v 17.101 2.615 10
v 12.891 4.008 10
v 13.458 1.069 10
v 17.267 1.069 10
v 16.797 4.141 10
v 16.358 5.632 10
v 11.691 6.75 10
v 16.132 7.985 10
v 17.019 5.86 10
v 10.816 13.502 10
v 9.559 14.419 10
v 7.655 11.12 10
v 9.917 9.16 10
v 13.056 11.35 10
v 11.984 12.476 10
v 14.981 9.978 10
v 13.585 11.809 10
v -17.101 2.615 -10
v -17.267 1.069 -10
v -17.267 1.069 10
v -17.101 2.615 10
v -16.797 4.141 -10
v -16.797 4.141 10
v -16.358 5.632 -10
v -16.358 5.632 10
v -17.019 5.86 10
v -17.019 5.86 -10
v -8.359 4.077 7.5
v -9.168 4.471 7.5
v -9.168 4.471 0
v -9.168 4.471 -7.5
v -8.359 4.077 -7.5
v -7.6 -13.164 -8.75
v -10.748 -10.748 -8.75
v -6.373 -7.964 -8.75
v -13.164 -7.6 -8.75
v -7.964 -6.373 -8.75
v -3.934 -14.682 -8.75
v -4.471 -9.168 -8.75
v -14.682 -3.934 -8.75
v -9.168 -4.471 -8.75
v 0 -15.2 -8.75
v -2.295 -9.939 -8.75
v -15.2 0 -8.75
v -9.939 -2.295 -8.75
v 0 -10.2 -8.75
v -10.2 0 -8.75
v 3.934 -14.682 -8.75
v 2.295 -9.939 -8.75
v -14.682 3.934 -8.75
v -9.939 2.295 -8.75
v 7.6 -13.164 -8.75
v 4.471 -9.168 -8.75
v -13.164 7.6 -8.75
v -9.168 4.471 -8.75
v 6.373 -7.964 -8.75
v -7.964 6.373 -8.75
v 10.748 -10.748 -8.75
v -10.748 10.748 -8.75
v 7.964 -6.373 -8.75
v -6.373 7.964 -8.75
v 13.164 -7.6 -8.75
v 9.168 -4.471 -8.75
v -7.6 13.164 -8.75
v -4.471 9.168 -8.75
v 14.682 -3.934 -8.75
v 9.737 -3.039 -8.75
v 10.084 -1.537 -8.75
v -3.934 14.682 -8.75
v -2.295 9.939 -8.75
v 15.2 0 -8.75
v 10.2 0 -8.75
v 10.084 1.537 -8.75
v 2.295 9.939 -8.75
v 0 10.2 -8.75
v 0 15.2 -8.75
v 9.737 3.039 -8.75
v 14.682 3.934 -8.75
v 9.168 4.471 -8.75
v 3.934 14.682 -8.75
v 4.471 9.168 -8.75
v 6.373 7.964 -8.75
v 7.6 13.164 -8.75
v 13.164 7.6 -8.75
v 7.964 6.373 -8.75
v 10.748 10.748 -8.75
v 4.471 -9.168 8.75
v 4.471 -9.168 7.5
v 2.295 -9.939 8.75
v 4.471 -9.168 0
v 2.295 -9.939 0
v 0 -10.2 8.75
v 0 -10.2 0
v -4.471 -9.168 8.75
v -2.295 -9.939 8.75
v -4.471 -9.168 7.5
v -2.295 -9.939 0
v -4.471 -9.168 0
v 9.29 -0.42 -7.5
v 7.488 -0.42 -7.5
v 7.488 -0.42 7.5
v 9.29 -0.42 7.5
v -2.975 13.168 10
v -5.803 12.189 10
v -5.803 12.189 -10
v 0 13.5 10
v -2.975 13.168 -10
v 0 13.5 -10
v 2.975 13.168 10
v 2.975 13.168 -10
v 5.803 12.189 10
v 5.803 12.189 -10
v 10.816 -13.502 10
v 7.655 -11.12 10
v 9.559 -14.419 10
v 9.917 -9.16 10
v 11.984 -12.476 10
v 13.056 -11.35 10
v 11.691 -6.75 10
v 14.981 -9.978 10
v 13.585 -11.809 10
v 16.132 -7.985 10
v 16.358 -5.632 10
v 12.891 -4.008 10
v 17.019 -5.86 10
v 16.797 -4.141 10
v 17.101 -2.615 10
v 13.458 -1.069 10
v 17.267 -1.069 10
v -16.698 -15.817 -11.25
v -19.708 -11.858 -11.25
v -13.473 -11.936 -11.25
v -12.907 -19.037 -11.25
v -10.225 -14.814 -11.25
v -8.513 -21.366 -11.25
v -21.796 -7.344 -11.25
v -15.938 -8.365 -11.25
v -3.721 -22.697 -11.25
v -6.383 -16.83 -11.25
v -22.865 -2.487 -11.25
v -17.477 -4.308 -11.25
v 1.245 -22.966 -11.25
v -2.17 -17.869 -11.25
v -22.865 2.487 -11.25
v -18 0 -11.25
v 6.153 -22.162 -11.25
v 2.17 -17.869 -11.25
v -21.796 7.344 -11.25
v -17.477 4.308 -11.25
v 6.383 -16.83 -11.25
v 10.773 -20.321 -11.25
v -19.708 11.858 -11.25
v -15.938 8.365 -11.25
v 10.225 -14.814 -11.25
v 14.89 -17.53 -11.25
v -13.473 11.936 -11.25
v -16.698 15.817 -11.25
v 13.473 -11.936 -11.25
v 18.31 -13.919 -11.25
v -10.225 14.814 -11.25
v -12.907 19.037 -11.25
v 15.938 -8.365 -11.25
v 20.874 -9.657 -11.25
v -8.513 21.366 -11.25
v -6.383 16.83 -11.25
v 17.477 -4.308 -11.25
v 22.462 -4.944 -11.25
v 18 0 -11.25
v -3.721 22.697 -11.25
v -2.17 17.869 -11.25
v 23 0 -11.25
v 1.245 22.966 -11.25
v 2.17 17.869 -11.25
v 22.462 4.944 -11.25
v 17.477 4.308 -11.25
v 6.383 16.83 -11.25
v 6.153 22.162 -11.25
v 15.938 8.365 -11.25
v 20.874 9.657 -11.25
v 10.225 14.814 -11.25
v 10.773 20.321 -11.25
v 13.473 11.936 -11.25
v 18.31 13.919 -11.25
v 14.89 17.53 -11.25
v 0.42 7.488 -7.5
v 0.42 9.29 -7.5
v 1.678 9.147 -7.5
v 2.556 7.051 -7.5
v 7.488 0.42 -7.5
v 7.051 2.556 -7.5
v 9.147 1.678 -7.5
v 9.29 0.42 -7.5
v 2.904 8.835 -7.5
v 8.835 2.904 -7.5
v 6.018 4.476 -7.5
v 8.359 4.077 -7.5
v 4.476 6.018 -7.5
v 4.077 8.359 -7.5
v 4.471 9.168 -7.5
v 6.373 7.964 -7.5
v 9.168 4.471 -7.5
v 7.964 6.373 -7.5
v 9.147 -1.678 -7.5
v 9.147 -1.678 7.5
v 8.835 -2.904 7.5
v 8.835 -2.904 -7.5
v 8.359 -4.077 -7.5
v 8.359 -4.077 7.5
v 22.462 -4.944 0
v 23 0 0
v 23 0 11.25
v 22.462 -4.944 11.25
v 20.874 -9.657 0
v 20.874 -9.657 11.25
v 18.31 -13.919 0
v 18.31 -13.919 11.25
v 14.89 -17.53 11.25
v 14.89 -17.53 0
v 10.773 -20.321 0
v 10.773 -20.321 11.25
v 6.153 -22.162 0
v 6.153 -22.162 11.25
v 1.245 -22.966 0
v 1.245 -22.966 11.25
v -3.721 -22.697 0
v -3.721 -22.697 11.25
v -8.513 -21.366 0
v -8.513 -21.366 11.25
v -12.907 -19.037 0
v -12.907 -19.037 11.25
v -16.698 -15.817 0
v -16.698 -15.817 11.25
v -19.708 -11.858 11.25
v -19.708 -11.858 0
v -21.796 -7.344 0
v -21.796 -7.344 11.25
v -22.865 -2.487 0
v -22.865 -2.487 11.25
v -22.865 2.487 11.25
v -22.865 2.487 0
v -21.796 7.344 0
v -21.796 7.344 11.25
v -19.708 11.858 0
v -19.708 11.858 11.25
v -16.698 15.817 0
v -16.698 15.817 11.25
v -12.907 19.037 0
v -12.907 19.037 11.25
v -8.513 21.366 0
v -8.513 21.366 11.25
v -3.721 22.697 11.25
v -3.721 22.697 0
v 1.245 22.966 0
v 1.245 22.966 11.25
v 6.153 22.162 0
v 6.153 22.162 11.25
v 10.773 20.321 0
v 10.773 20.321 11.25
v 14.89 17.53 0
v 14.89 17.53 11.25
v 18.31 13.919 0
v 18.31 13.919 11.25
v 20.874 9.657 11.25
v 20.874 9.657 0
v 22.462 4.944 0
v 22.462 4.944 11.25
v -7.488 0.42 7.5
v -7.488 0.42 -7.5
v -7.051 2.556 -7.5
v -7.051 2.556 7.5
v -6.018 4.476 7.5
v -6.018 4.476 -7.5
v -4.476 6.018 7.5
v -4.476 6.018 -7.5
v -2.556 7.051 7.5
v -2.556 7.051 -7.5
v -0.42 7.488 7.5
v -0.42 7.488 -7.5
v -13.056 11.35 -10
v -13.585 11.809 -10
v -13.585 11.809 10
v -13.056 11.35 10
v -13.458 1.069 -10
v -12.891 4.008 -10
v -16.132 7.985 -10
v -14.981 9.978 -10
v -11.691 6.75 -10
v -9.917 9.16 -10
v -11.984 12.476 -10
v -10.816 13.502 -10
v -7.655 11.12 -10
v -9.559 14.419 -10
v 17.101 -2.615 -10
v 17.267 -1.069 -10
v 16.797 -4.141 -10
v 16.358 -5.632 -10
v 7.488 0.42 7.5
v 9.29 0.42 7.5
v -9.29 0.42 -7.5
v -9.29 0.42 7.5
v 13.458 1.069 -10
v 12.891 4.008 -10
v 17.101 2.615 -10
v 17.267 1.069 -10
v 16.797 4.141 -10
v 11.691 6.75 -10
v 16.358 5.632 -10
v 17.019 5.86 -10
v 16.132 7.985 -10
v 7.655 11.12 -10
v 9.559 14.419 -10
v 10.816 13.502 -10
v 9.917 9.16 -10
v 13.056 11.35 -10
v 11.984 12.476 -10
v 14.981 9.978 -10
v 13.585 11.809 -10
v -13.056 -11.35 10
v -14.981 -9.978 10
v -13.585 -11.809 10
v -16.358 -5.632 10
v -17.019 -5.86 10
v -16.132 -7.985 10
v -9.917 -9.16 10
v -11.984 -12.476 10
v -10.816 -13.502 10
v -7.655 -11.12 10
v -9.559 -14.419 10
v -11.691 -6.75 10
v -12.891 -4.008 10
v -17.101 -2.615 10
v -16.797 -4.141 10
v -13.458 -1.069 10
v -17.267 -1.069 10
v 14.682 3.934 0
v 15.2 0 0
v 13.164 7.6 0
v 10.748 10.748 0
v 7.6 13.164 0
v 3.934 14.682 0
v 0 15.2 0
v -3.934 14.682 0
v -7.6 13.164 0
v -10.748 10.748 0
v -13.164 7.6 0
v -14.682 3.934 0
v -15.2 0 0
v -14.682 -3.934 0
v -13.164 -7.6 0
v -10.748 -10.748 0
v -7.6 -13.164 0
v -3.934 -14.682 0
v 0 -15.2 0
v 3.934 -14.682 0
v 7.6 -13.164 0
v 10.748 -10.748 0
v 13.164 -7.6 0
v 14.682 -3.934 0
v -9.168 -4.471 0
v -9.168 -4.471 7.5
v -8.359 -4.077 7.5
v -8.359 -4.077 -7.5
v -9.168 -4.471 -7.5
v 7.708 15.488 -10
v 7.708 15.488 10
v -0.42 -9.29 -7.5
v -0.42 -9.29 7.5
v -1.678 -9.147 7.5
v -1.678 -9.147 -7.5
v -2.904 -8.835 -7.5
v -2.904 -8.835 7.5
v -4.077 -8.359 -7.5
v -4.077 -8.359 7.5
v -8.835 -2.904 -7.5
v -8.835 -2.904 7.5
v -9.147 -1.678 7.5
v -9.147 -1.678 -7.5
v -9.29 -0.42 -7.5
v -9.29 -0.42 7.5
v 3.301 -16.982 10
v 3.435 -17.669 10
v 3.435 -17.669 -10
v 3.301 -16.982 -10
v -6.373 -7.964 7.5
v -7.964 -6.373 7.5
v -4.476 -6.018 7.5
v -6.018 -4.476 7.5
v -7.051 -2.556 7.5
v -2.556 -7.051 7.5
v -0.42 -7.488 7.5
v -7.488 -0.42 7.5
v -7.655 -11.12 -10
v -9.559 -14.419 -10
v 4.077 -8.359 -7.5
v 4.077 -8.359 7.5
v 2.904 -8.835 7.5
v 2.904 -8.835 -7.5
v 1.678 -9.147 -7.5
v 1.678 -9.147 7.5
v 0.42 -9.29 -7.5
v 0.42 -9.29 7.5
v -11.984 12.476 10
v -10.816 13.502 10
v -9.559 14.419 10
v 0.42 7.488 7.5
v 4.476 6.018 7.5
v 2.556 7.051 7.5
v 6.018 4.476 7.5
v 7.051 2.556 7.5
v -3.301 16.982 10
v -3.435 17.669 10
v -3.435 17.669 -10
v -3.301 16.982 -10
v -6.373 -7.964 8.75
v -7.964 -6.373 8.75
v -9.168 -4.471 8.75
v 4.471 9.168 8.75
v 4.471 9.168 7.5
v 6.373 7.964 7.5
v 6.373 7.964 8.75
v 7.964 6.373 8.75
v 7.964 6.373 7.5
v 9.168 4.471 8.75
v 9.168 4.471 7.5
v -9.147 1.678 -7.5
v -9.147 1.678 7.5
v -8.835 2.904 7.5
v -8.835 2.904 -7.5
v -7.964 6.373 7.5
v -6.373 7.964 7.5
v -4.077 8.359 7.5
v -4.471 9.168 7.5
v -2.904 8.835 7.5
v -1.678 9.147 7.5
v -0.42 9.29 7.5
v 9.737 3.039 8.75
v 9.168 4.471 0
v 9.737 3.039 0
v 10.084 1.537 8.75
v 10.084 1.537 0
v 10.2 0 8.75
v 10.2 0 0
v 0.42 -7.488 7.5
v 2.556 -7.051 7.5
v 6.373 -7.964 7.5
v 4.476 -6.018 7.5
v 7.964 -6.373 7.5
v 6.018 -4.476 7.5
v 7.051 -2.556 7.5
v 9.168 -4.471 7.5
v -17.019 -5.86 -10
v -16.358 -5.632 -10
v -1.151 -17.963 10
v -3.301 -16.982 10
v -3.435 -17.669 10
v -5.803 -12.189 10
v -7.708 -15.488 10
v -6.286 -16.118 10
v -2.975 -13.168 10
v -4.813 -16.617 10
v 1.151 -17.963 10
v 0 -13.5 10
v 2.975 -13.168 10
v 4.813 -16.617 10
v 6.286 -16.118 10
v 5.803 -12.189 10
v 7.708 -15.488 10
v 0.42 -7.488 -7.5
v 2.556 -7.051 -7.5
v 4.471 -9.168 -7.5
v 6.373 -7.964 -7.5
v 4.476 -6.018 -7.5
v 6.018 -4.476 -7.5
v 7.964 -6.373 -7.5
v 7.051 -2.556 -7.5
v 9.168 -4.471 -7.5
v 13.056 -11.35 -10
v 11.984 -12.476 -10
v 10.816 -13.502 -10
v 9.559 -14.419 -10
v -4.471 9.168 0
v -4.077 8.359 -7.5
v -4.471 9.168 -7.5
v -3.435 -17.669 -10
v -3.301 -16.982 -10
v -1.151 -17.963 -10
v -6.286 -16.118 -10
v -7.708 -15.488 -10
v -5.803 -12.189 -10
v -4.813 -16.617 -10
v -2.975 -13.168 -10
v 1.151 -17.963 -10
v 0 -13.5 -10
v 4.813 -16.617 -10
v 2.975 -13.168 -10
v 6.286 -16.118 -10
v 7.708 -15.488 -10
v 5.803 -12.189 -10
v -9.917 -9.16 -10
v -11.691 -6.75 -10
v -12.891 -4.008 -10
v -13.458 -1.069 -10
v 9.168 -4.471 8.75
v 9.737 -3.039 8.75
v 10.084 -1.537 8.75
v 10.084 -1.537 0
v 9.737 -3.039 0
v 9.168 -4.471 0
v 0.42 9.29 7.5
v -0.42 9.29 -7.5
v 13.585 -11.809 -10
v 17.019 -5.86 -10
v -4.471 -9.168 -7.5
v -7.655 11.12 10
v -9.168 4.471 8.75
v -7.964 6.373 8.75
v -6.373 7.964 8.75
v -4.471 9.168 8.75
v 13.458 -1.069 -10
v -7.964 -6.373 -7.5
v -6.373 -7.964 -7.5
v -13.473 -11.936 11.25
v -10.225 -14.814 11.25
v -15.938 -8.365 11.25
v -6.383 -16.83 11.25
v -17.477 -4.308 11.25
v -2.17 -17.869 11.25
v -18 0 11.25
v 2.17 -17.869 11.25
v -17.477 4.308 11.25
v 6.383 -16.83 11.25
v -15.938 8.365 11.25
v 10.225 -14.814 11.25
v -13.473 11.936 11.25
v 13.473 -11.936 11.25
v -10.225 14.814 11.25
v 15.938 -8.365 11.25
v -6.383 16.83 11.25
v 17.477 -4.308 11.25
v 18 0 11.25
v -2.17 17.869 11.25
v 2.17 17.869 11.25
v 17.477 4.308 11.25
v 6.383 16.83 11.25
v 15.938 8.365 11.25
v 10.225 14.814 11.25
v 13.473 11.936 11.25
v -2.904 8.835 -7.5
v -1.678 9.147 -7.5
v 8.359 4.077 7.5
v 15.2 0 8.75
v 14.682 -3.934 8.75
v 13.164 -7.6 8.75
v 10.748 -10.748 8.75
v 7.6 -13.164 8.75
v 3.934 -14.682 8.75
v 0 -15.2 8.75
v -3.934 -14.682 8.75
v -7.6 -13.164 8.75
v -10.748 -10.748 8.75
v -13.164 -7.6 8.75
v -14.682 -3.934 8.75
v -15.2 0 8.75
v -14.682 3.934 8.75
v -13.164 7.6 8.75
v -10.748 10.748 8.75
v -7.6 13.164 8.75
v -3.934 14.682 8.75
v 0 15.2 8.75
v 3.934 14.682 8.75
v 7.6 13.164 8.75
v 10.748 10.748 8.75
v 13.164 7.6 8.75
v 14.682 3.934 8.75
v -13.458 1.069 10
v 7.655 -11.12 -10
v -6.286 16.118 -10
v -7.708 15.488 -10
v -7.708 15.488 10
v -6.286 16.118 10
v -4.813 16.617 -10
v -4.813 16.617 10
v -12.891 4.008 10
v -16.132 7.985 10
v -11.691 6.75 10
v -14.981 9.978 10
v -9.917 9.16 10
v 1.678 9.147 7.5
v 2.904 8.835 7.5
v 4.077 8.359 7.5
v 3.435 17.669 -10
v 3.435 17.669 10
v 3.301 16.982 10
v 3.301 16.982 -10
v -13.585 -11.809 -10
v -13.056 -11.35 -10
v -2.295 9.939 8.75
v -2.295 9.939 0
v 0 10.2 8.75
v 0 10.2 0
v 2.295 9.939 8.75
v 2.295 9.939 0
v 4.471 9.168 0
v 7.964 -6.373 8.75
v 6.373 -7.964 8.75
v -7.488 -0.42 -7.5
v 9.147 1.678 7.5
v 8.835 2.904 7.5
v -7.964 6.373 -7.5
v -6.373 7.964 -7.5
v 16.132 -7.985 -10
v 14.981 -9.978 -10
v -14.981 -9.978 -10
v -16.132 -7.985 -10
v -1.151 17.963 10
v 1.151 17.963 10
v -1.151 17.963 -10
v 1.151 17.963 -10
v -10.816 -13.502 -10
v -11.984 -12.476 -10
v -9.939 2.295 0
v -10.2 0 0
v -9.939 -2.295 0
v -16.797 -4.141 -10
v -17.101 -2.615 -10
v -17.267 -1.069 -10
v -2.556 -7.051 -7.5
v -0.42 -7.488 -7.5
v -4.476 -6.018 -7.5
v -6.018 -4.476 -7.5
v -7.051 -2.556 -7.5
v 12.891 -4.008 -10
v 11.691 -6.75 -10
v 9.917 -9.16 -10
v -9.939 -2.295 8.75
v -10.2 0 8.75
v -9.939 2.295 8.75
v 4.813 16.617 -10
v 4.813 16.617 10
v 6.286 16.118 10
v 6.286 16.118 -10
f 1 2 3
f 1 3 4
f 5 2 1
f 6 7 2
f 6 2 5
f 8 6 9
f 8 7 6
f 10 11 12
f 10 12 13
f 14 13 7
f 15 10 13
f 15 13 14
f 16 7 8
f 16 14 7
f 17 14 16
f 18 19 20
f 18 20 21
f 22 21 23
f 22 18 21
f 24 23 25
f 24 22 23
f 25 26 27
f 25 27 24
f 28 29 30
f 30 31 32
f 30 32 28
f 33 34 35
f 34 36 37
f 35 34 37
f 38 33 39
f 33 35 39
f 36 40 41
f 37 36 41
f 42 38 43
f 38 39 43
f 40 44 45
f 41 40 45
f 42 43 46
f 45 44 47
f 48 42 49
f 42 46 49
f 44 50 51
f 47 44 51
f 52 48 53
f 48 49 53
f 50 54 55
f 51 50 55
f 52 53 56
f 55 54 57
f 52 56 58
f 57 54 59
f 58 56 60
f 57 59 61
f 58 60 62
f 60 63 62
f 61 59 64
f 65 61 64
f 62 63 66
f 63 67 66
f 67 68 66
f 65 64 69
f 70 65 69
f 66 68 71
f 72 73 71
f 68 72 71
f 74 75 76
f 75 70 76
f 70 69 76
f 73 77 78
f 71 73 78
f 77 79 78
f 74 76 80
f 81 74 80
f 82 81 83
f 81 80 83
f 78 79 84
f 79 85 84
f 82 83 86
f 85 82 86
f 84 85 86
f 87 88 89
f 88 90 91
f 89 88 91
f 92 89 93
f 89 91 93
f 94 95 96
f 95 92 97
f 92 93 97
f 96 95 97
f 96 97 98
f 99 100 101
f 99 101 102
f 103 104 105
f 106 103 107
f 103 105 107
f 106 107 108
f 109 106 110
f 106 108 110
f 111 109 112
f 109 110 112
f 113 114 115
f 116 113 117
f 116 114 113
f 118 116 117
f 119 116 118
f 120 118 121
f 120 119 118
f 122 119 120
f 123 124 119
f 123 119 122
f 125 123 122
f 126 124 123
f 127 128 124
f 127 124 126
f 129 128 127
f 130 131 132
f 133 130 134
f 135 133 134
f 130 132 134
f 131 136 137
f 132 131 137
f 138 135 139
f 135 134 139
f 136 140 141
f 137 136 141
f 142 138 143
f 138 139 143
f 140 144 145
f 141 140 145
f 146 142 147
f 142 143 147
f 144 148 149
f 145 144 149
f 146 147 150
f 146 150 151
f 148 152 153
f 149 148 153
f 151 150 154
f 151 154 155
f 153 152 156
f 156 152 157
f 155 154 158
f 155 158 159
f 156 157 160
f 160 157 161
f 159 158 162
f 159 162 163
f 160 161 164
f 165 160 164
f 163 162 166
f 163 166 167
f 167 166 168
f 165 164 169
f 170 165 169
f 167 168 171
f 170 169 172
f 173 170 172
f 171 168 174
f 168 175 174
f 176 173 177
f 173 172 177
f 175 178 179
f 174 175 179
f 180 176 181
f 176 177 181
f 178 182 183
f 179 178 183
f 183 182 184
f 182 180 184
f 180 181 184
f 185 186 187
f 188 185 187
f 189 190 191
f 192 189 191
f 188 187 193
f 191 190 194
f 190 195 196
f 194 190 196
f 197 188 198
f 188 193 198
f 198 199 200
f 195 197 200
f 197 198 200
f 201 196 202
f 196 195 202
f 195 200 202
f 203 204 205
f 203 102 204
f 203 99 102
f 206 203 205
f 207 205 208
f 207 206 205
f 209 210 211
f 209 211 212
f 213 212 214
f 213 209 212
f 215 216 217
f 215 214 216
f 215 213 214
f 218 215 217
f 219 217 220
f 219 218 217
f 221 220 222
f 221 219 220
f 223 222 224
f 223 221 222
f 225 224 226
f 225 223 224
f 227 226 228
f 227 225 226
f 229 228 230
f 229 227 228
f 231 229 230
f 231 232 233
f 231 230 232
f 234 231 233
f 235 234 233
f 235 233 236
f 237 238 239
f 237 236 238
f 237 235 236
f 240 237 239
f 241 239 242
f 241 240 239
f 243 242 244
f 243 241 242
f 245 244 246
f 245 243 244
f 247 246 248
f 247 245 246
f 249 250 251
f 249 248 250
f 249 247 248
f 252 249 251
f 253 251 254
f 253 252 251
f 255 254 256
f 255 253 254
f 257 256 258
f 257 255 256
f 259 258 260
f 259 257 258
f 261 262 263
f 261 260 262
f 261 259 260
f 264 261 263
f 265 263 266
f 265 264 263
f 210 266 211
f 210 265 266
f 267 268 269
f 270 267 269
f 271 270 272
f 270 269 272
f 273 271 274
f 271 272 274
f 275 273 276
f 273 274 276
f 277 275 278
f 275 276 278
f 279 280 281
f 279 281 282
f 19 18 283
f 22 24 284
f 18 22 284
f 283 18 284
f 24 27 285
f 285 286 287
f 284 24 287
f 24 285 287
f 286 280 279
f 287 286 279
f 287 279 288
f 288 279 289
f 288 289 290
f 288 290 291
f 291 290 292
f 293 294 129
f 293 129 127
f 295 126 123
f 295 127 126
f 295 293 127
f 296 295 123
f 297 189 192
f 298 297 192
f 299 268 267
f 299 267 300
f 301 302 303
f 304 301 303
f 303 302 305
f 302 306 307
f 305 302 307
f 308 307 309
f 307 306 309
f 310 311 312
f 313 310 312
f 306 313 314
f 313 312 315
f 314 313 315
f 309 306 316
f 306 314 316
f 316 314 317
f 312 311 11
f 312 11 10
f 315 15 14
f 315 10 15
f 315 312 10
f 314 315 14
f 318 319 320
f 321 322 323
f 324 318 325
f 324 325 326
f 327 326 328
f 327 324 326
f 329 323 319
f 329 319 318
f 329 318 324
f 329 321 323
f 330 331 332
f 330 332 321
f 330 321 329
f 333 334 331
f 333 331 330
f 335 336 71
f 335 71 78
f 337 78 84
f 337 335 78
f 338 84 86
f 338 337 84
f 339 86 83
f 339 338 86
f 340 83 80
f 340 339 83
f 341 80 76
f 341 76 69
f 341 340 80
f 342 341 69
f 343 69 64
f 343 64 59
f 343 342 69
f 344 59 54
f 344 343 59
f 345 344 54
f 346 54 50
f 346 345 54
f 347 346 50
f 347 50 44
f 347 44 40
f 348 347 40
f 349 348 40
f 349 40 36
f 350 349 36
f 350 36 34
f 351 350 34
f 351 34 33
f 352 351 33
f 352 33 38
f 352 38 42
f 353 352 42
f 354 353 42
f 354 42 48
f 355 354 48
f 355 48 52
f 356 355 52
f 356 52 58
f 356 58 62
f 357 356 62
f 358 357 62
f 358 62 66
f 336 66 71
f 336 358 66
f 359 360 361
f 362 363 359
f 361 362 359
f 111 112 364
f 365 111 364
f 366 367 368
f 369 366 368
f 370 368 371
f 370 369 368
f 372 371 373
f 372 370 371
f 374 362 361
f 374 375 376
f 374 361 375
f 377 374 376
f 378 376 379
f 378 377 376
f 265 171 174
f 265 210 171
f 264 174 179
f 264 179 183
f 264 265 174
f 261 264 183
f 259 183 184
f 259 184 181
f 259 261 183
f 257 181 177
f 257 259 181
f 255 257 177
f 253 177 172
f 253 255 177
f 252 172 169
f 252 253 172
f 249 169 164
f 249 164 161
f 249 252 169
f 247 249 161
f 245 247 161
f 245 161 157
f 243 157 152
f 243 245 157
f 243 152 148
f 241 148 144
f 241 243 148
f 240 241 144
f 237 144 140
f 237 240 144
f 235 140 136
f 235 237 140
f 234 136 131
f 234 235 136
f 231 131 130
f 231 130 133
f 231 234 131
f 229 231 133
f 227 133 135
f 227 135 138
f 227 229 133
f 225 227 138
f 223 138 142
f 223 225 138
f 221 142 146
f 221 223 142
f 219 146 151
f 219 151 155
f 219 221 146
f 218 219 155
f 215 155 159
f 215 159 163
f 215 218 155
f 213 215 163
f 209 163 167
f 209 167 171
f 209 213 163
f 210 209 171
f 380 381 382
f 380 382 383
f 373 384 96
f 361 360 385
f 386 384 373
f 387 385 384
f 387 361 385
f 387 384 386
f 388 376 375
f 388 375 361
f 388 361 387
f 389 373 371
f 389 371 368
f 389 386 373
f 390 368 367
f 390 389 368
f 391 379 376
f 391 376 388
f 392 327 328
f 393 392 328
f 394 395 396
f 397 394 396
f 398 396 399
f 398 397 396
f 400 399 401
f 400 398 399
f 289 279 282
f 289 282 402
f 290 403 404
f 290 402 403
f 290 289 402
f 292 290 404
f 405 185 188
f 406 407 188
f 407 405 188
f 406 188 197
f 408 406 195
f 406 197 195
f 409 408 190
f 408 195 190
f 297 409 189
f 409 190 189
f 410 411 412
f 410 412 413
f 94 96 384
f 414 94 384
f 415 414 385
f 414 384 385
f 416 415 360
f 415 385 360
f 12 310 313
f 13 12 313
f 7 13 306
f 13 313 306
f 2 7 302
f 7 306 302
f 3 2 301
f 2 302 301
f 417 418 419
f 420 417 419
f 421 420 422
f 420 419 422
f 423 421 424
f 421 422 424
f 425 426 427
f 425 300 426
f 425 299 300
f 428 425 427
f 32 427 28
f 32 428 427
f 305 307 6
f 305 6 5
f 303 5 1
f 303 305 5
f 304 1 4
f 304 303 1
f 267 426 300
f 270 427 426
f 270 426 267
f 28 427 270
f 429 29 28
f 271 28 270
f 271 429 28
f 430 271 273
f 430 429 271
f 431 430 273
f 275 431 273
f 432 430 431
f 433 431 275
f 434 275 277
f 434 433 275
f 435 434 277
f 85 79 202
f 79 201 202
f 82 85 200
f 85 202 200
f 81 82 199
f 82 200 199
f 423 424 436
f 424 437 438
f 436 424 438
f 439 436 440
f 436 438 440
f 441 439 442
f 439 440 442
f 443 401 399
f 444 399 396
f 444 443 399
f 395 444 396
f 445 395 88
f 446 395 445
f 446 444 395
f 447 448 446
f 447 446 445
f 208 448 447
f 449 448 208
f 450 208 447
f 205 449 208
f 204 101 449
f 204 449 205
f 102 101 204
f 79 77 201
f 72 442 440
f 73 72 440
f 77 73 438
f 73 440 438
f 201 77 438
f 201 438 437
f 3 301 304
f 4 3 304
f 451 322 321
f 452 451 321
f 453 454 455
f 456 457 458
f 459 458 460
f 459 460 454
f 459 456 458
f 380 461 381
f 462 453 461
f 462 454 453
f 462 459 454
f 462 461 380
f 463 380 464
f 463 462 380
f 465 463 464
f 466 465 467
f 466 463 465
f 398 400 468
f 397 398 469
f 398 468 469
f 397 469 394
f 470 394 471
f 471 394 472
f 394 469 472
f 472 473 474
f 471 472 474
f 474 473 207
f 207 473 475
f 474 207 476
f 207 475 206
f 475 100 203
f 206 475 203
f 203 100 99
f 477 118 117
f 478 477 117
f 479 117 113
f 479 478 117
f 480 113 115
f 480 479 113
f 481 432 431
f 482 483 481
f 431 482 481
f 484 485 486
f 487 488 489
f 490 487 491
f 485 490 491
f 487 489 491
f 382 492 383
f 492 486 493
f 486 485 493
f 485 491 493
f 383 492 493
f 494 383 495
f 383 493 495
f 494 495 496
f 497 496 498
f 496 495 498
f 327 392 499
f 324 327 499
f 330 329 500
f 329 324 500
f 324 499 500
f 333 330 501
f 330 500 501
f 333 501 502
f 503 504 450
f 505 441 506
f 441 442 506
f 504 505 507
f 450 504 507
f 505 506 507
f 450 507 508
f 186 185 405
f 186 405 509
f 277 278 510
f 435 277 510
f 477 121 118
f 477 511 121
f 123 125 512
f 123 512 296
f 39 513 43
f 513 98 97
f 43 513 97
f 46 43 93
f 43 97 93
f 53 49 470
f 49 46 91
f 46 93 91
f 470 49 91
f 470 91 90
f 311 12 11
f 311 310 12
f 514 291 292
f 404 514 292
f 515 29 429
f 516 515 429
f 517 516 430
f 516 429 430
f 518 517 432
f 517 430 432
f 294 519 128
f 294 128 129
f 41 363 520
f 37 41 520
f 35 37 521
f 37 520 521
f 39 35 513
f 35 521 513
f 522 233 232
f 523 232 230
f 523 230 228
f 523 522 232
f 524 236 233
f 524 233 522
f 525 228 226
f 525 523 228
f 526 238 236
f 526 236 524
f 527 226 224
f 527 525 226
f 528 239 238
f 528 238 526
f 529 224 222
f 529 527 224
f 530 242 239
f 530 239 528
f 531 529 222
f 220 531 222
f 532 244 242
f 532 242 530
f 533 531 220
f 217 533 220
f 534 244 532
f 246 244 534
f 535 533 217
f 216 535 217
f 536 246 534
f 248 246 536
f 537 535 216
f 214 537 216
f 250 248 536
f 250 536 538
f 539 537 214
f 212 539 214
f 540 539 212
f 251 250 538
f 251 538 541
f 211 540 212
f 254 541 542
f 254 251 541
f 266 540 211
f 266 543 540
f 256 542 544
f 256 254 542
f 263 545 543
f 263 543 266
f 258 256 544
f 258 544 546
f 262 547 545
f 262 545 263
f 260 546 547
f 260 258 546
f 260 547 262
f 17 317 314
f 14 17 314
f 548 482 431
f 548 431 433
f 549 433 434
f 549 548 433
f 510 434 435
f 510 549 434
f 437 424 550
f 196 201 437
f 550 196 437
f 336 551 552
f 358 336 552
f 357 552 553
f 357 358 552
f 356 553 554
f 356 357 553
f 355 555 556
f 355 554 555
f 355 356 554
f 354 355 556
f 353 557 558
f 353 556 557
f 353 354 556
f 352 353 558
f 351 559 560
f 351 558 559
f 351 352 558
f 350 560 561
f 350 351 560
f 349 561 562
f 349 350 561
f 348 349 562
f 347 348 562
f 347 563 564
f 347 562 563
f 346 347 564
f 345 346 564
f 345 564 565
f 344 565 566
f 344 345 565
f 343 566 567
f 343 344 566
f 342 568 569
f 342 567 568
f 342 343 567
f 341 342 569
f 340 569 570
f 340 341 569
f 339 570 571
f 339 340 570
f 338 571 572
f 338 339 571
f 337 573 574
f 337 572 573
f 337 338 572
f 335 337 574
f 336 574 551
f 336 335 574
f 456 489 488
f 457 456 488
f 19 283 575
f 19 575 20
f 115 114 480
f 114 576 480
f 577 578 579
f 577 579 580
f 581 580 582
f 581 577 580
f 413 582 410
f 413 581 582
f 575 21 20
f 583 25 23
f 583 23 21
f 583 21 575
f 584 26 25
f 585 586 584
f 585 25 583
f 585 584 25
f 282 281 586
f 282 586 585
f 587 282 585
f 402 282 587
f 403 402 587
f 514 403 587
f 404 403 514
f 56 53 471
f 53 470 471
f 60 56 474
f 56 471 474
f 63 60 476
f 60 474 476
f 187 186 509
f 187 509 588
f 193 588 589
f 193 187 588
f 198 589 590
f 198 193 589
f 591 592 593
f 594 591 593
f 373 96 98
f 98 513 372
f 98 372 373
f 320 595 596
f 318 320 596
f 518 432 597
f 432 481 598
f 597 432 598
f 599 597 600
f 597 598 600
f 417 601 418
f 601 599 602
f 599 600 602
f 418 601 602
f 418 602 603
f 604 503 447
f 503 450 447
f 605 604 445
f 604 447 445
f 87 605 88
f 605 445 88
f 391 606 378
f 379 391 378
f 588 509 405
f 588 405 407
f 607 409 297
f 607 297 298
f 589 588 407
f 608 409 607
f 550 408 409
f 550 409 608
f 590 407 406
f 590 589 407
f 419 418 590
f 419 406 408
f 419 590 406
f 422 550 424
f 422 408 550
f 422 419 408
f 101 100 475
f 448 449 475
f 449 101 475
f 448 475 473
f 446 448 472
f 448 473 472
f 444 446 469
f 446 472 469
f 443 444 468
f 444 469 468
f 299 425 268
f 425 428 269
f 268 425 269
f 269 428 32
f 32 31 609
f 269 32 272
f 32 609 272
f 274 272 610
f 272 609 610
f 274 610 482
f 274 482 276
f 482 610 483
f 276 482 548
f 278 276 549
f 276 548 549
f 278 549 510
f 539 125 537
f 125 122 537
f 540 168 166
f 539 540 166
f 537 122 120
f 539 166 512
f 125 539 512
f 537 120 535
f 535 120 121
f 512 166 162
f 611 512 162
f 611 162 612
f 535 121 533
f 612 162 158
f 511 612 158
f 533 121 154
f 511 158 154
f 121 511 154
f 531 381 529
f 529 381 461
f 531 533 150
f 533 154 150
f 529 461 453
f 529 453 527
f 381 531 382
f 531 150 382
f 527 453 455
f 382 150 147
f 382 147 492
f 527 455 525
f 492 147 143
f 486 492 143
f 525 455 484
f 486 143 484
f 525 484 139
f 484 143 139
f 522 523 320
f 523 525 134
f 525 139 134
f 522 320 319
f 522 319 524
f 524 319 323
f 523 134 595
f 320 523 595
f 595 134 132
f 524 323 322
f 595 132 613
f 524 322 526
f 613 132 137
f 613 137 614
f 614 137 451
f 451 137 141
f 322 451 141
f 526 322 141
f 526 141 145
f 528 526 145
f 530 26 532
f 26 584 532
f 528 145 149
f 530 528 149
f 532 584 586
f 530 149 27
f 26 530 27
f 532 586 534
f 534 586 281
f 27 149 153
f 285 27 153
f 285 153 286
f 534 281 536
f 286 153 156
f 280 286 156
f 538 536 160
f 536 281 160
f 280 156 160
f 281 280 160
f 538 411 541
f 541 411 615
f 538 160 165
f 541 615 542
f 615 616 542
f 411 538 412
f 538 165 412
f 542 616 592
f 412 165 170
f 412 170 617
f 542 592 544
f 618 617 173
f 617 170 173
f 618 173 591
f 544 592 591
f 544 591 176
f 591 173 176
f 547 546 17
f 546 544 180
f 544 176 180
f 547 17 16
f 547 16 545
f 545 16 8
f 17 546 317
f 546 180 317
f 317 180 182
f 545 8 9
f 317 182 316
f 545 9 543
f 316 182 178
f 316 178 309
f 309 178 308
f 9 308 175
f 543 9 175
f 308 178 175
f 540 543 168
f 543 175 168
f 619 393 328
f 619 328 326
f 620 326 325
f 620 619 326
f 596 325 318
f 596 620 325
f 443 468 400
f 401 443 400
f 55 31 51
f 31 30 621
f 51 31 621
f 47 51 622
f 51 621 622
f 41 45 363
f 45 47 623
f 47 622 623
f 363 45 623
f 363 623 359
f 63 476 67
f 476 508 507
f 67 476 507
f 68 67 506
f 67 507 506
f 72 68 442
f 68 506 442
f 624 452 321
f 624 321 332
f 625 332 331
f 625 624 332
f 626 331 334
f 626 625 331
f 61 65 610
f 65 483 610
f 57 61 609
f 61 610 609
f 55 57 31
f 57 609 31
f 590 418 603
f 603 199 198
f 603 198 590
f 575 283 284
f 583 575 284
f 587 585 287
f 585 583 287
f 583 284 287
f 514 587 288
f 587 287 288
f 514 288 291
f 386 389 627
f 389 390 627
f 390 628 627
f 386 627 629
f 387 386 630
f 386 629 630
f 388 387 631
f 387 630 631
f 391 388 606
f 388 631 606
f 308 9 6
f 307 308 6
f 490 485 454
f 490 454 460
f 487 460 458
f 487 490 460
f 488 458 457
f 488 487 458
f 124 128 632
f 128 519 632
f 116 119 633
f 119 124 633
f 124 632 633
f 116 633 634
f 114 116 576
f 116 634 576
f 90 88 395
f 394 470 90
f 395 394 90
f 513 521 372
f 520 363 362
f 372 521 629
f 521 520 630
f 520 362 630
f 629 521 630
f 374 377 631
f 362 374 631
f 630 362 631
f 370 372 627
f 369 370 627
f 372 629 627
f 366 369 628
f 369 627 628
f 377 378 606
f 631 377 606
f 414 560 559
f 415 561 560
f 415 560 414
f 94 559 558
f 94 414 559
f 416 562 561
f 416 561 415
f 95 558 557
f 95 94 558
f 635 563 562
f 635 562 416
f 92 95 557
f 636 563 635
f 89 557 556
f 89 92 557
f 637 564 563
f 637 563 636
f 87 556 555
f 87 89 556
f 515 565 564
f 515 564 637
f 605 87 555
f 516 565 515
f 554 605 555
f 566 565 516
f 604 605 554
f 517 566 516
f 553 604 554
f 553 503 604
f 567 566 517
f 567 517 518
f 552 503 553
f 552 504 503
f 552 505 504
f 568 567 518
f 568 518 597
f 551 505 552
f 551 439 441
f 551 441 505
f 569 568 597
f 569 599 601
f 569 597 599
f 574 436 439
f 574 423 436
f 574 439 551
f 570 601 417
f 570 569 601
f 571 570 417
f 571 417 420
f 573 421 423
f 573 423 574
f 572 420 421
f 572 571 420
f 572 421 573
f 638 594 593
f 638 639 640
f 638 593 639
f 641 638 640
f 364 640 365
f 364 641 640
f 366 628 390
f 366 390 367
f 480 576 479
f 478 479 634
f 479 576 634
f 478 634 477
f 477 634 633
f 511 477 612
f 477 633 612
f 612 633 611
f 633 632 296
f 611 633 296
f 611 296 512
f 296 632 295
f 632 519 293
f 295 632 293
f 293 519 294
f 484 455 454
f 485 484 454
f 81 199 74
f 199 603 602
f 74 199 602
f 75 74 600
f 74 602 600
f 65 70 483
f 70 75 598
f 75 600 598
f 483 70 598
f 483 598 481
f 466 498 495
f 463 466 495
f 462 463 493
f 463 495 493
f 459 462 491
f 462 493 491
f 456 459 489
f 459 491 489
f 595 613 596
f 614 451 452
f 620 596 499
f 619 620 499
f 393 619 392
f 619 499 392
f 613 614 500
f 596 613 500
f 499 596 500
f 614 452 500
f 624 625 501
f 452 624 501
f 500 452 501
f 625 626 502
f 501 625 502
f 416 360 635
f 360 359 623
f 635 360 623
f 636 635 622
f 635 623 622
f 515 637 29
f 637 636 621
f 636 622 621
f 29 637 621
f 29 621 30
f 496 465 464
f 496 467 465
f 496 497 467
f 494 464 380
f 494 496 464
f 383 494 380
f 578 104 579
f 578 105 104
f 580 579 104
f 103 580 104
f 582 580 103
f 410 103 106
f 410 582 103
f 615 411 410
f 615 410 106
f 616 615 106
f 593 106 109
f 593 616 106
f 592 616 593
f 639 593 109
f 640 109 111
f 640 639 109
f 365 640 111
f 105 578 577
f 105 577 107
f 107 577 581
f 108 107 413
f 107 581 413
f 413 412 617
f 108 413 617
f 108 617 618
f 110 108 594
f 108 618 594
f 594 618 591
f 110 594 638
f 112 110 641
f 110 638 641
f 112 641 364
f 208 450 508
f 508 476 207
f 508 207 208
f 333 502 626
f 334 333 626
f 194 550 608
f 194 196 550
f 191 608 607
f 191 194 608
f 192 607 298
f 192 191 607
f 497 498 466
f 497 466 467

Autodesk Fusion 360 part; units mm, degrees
sketch "Sketch1" plane through (0, 0, 0) normal (0, 0, 1) x (1, 0, 0) in component "6 Electrodes"
  circle A0 centre (0, 0) radius 13.5
  circle A1 centre (0, 0) radius 18
  circle A2 centre (0, 0) radius 17.3
  circle A3 centre (0, 0) radius 23
  line L0 (13.4576, -1.069) -> (17.2669, -1.069)
  line L1 (13.4576, 1.069) -> (17.2669, 1.069)
  line L2 (7.6546, 11.1201) -> (9.5593, 14.4191)
  line L3 (5.803, 12.1891) -> (7.7077, 15.4881)
  line L4 (-5.803, 12.1891) -> (-7.7077, 15.4881)
  line L5 (-7.6546, 11.1201) -> (-9.5593, 14.4191)
  line L6 (-13.4576, 1.069) -> (-17.2669, 1.069)
  line L7 (-13.4576, -1.069) -> (-17.2669, -1.069)
  line L8 (-7.6546, -11.1201) -> (-9.5593, -14.4191)
  line L9 (-5.803, -12.1891) -> (-7.7077, -15.4881)
  line L10 (5.803, -12.1891) -> (7.7077, -15.4881)
  line L11 (7.6546, -11.1201) -> (9.5593, -14.4191)
  line L12 (3.4346, -17.6693) -> (3.301, -16.9822)
  line L13 (-3.4346, -17.6693) -> (-3.301, -16.9822)
  line L14 (17.0193, -5.8602) -> (16.3575, -5.6323)
  line L15 (13.5848, -11.8091) -> (13.0565, -11.3498)
  line L16 (13.5848, 11.8091) -> (13.0565, 11.3498)
  line L17 (17.0193, 5.8602) -> (16.3575, 5.6323)
  line L18 (-3.4346, 17.6693) -> (-3.301, 16.9822)
  line L19 (3.4346, 17.6693) -> (3.301, 16.9822)
  line L20 (-17.0193, 5.8602) -> (-16.3575, 5.6323)
  line L21 (-13.5848, 11.8091) -> (-13.0565, 11.3498)
  line L22 (-13.5848, -11.8091) -> (-13.0565, -11.3498)
  line L23 (-17.0193, -5.8602) -> (-16.3575, -5.6323)
  dimension "d51" = 1.069
  dimension "d52" = 1.069
  dimension "d54" = 360
  dimension "d56" = 360
extrude "Extrude1" add sketch "Sketch1" along normal mid plane 20 contours A0 A2 L1 L2 | A0 A2 L0 L11 | A0 A2 L3 L4 | A1 A2 L16 L17 | A0 A2 L9 L10 | A1 A2 L14 L15 | A0 A2 L5 L6 | A1 A2 L18 L19 | A0 A2 L7 L8 | A1 A2 L12 L13 | A1 A2 L20 L21 | A1 A2 L22 L23 makes body 1 at (13.3885, -1.7318, 3.3333) makes body 2 at (5.1944, -12.4607, 3.3333) makes body 3 at (12.2998, 5.5646, 3.3333) makes body 4 at (-2.6487, 13.2376, 3.3333) makes body 5 at (-8.7135, 10.3114, 3.3333) makes body 6 at (-10.969, -7.8697, 3.3333) in component "6 Electrodes"
extrude "Extrude2" add sketch "Sketch1" along normal mid plane 22.5 bodies 1 2 3 4 5 6 in component "6 Electrodes"
sketch "Sketch1 (2)" plane through (0, 0, 0) normal (0, 0, 1) x (1, 0, 0) in component "4 Electrodes"
  circle A0 centre (0, 0) radius 7.5
  circle A1 centre (0, 0) radius 10.2
  circle A2 centre (0, 0) radius 9.3
  circle A3 centre (0, 0) radius 15.2
  line L0 (7.4882, -0.4205) -> (9.2905, -0.4205)
  line L1 (7.4882, 0.4205) -> (9.2905, 0.4205)
  line L2 (0.4205, 7.4882) -> (0.4205, 9.2905)
  line L3 (-0.4205, 7.4882) -> (-0.4205, 9.2905)
  line L4 (-7.4882, 0.4205) -> (-9.2905, 0.4205)
  line L5 (-7.4882, -0.4205) -> (-9.2905, -0.4205)
  line L6 (-0.4205, -7.4882) -> (-0.4205, -9.2905)
  line L7 (0.4205, -7.4882) -> (0.4205, -9.2905)
  line L8 (-4.4714, -9.1677) -> (-4.0769, -8.3588)
  line L9 (-9.1677, -4.4714) -> (-8.3588, -4.0769)
  line L10 (9.1677, -4.4714) -> (8.3588, -4.0769)
  line L11 (4.4714, -9.1677) -> (4.0769, -8.3588)
  line L12 (4.4714, 9.1677) -> (4.0769, 8.3588)
  line L13 (9.1677, 4.4714) -> (8.3588, 4.0769)
  line L14 (-9.1677, 4.4714) -> (-8.3588, 4.0769)
  line L15 (-4.4714, 9.1677) -> (-4.0769, 8.3588)
  dimension "d61" = 0.4205
  dimension "d62" = 0.4205
  dimension "d64" = 360
  dimension "d66" = 360
extrude "Extrude1'" add sketch "Sketch1 (2)" along normal mid plane 15 separate body contours A0 A2 L1 L2 | A0 A2 L0 L7 | A0 A2 L3 L4 | A1 A2 L12 L13 | A0 A2 L5 L6 | A1 A2 L10 L11 | A1 A2 L14 L15 | A1 A2 L8 L9 makes body 7 at (3.8708, 6.4239, 2.5) makes body 8 at (-7.412, 1.1455, 2.5) makes body 9 at (5.5548, -5.0393, 2.5) makes body 10 at (-3.2288, -6.7694, -2.5) in component "4 Electrodes"
extrude "Extrude2'" add sketch "Sketch1 (2)" along normal mid plane 17.5 bodies 7 8 9 10 in component "4 Electrodes"
component "6 Electrodes" placed x (1, 0, 0) y (0, 1, 0) z (0, 0, 1) at (0, 0, 0)
component "4 Electrodes" placed x (1, 0, 0) y (0, 1, 0) z (0, 0, 1) at (0, 0, 0)
